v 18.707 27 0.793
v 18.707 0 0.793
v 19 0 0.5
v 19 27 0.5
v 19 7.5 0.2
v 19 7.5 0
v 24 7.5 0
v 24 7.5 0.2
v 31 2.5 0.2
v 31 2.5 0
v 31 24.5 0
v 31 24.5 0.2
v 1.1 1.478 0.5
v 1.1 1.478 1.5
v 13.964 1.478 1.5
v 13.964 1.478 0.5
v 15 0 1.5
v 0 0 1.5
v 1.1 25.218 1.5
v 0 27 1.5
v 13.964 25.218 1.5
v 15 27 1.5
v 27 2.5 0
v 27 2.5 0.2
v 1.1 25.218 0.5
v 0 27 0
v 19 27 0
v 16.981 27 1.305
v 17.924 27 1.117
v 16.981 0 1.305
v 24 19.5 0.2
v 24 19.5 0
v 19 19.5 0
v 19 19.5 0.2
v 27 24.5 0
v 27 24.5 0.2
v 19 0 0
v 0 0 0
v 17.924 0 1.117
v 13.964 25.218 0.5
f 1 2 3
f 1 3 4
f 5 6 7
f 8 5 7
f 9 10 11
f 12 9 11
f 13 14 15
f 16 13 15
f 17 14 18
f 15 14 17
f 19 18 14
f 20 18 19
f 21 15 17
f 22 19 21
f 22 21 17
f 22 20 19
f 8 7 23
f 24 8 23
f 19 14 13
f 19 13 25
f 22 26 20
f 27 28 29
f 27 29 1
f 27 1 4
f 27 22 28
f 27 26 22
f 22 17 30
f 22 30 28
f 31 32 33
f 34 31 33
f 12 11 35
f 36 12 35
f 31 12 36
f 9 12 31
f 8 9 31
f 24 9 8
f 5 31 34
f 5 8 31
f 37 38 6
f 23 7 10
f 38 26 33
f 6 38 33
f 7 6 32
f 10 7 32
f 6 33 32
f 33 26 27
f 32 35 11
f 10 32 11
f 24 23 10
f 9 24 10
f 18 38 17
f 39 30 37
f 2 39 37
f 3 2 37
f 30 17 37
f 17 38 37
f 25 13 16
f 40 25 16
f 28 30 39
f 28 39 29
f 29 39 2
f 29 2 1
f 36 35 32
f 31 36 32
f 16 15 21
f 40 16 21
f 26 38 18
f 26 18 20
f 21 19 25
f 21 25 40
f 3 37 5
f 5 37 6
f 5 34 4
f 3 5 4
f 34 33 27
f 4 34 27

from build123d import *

# Parameters (mm, degrees)
SKETCH_W        = 19
SKETCH_H        = 27
PAD_DEPTH       = 1.5
PAD001_DEPTH    = 0.2
SKETCH003_W     = 12.864
SKETCH003_H     = 23.74
POCKET_DEPTH    = 1
CHAMFER_SIZE    = 1
CHAMFER001_SIZE = 1
CHAMFER002_SIZE = 1
CHAMFER003_SIZE = 1


with BuildPart() as part:
    # Sketch → Pad (new body)
    with BuildSketch(Plane.XY):
        with Locations((9.5, 13.5)):
            Rectangle(SKETCH_W, SKETCH_H)
    extrude(amount=PAD_DEPTH)

    # Sketch001 (on Face5 of Pad) → Pad001 (join)
    with BuildSketch(Plane(origin=(0, 0, 0), x_dir=(1, 0, 0), z_dir=(0, 0, -1))):
        Polygon((18, -7.5), (24, -7.5), (27, -2.5), (31, -2.5), (31, -24.5), (27, -24.5), (24, -19.5), (18, -19.5), align=None)
    extrude(amount=-PAD001_DEPTH)

    # Sketch003 (on Face5 of Pad001) → Pocket (cut)
    with BuildSketch(Plane.XY.offset(1.5)):
        with Locations((7.532, 13.348)):
            Rectangle(SKETCH003_W, SKETCH003_H)
    extrude(amount=-POCKET_DEPTH, mode=Mode.SUBTRACT)

    # Chamfer
    chamfer_edges = [part.edges().sort_by_distance(p)[0] for p in [
        (19, 13.5, 1.5),
    ]]
    chamfer(chamfer_edges, length=CHAMFER_SIZE)

    # Chamfer001
    chamfer001_edges = [part.edges().sort_by_distance(p)[0] for p in [
        (18, 13.5, 1.5),
    ]]
    chamfer(chamfer001_edges, length=CHAMFER001_SIZE)

    # Chamfer002
    chamfer002_edges = [part.edges().sort_by_distance(p)[0] for p in [
        (17, 13.5, 1.5),
    ]]
    chamfer(chamfer002_edges, length=CHAMFER002_SIZE)

    # Chamfer003
    chamfer003_edges = [part.edges().sort_by_distance(p)[0] for p in [
        (16, 13.5, 1.5),
    ]]
    chamfer(chamfer003_edges, length=CHAMFER003_SIZE)


solid = part.part
